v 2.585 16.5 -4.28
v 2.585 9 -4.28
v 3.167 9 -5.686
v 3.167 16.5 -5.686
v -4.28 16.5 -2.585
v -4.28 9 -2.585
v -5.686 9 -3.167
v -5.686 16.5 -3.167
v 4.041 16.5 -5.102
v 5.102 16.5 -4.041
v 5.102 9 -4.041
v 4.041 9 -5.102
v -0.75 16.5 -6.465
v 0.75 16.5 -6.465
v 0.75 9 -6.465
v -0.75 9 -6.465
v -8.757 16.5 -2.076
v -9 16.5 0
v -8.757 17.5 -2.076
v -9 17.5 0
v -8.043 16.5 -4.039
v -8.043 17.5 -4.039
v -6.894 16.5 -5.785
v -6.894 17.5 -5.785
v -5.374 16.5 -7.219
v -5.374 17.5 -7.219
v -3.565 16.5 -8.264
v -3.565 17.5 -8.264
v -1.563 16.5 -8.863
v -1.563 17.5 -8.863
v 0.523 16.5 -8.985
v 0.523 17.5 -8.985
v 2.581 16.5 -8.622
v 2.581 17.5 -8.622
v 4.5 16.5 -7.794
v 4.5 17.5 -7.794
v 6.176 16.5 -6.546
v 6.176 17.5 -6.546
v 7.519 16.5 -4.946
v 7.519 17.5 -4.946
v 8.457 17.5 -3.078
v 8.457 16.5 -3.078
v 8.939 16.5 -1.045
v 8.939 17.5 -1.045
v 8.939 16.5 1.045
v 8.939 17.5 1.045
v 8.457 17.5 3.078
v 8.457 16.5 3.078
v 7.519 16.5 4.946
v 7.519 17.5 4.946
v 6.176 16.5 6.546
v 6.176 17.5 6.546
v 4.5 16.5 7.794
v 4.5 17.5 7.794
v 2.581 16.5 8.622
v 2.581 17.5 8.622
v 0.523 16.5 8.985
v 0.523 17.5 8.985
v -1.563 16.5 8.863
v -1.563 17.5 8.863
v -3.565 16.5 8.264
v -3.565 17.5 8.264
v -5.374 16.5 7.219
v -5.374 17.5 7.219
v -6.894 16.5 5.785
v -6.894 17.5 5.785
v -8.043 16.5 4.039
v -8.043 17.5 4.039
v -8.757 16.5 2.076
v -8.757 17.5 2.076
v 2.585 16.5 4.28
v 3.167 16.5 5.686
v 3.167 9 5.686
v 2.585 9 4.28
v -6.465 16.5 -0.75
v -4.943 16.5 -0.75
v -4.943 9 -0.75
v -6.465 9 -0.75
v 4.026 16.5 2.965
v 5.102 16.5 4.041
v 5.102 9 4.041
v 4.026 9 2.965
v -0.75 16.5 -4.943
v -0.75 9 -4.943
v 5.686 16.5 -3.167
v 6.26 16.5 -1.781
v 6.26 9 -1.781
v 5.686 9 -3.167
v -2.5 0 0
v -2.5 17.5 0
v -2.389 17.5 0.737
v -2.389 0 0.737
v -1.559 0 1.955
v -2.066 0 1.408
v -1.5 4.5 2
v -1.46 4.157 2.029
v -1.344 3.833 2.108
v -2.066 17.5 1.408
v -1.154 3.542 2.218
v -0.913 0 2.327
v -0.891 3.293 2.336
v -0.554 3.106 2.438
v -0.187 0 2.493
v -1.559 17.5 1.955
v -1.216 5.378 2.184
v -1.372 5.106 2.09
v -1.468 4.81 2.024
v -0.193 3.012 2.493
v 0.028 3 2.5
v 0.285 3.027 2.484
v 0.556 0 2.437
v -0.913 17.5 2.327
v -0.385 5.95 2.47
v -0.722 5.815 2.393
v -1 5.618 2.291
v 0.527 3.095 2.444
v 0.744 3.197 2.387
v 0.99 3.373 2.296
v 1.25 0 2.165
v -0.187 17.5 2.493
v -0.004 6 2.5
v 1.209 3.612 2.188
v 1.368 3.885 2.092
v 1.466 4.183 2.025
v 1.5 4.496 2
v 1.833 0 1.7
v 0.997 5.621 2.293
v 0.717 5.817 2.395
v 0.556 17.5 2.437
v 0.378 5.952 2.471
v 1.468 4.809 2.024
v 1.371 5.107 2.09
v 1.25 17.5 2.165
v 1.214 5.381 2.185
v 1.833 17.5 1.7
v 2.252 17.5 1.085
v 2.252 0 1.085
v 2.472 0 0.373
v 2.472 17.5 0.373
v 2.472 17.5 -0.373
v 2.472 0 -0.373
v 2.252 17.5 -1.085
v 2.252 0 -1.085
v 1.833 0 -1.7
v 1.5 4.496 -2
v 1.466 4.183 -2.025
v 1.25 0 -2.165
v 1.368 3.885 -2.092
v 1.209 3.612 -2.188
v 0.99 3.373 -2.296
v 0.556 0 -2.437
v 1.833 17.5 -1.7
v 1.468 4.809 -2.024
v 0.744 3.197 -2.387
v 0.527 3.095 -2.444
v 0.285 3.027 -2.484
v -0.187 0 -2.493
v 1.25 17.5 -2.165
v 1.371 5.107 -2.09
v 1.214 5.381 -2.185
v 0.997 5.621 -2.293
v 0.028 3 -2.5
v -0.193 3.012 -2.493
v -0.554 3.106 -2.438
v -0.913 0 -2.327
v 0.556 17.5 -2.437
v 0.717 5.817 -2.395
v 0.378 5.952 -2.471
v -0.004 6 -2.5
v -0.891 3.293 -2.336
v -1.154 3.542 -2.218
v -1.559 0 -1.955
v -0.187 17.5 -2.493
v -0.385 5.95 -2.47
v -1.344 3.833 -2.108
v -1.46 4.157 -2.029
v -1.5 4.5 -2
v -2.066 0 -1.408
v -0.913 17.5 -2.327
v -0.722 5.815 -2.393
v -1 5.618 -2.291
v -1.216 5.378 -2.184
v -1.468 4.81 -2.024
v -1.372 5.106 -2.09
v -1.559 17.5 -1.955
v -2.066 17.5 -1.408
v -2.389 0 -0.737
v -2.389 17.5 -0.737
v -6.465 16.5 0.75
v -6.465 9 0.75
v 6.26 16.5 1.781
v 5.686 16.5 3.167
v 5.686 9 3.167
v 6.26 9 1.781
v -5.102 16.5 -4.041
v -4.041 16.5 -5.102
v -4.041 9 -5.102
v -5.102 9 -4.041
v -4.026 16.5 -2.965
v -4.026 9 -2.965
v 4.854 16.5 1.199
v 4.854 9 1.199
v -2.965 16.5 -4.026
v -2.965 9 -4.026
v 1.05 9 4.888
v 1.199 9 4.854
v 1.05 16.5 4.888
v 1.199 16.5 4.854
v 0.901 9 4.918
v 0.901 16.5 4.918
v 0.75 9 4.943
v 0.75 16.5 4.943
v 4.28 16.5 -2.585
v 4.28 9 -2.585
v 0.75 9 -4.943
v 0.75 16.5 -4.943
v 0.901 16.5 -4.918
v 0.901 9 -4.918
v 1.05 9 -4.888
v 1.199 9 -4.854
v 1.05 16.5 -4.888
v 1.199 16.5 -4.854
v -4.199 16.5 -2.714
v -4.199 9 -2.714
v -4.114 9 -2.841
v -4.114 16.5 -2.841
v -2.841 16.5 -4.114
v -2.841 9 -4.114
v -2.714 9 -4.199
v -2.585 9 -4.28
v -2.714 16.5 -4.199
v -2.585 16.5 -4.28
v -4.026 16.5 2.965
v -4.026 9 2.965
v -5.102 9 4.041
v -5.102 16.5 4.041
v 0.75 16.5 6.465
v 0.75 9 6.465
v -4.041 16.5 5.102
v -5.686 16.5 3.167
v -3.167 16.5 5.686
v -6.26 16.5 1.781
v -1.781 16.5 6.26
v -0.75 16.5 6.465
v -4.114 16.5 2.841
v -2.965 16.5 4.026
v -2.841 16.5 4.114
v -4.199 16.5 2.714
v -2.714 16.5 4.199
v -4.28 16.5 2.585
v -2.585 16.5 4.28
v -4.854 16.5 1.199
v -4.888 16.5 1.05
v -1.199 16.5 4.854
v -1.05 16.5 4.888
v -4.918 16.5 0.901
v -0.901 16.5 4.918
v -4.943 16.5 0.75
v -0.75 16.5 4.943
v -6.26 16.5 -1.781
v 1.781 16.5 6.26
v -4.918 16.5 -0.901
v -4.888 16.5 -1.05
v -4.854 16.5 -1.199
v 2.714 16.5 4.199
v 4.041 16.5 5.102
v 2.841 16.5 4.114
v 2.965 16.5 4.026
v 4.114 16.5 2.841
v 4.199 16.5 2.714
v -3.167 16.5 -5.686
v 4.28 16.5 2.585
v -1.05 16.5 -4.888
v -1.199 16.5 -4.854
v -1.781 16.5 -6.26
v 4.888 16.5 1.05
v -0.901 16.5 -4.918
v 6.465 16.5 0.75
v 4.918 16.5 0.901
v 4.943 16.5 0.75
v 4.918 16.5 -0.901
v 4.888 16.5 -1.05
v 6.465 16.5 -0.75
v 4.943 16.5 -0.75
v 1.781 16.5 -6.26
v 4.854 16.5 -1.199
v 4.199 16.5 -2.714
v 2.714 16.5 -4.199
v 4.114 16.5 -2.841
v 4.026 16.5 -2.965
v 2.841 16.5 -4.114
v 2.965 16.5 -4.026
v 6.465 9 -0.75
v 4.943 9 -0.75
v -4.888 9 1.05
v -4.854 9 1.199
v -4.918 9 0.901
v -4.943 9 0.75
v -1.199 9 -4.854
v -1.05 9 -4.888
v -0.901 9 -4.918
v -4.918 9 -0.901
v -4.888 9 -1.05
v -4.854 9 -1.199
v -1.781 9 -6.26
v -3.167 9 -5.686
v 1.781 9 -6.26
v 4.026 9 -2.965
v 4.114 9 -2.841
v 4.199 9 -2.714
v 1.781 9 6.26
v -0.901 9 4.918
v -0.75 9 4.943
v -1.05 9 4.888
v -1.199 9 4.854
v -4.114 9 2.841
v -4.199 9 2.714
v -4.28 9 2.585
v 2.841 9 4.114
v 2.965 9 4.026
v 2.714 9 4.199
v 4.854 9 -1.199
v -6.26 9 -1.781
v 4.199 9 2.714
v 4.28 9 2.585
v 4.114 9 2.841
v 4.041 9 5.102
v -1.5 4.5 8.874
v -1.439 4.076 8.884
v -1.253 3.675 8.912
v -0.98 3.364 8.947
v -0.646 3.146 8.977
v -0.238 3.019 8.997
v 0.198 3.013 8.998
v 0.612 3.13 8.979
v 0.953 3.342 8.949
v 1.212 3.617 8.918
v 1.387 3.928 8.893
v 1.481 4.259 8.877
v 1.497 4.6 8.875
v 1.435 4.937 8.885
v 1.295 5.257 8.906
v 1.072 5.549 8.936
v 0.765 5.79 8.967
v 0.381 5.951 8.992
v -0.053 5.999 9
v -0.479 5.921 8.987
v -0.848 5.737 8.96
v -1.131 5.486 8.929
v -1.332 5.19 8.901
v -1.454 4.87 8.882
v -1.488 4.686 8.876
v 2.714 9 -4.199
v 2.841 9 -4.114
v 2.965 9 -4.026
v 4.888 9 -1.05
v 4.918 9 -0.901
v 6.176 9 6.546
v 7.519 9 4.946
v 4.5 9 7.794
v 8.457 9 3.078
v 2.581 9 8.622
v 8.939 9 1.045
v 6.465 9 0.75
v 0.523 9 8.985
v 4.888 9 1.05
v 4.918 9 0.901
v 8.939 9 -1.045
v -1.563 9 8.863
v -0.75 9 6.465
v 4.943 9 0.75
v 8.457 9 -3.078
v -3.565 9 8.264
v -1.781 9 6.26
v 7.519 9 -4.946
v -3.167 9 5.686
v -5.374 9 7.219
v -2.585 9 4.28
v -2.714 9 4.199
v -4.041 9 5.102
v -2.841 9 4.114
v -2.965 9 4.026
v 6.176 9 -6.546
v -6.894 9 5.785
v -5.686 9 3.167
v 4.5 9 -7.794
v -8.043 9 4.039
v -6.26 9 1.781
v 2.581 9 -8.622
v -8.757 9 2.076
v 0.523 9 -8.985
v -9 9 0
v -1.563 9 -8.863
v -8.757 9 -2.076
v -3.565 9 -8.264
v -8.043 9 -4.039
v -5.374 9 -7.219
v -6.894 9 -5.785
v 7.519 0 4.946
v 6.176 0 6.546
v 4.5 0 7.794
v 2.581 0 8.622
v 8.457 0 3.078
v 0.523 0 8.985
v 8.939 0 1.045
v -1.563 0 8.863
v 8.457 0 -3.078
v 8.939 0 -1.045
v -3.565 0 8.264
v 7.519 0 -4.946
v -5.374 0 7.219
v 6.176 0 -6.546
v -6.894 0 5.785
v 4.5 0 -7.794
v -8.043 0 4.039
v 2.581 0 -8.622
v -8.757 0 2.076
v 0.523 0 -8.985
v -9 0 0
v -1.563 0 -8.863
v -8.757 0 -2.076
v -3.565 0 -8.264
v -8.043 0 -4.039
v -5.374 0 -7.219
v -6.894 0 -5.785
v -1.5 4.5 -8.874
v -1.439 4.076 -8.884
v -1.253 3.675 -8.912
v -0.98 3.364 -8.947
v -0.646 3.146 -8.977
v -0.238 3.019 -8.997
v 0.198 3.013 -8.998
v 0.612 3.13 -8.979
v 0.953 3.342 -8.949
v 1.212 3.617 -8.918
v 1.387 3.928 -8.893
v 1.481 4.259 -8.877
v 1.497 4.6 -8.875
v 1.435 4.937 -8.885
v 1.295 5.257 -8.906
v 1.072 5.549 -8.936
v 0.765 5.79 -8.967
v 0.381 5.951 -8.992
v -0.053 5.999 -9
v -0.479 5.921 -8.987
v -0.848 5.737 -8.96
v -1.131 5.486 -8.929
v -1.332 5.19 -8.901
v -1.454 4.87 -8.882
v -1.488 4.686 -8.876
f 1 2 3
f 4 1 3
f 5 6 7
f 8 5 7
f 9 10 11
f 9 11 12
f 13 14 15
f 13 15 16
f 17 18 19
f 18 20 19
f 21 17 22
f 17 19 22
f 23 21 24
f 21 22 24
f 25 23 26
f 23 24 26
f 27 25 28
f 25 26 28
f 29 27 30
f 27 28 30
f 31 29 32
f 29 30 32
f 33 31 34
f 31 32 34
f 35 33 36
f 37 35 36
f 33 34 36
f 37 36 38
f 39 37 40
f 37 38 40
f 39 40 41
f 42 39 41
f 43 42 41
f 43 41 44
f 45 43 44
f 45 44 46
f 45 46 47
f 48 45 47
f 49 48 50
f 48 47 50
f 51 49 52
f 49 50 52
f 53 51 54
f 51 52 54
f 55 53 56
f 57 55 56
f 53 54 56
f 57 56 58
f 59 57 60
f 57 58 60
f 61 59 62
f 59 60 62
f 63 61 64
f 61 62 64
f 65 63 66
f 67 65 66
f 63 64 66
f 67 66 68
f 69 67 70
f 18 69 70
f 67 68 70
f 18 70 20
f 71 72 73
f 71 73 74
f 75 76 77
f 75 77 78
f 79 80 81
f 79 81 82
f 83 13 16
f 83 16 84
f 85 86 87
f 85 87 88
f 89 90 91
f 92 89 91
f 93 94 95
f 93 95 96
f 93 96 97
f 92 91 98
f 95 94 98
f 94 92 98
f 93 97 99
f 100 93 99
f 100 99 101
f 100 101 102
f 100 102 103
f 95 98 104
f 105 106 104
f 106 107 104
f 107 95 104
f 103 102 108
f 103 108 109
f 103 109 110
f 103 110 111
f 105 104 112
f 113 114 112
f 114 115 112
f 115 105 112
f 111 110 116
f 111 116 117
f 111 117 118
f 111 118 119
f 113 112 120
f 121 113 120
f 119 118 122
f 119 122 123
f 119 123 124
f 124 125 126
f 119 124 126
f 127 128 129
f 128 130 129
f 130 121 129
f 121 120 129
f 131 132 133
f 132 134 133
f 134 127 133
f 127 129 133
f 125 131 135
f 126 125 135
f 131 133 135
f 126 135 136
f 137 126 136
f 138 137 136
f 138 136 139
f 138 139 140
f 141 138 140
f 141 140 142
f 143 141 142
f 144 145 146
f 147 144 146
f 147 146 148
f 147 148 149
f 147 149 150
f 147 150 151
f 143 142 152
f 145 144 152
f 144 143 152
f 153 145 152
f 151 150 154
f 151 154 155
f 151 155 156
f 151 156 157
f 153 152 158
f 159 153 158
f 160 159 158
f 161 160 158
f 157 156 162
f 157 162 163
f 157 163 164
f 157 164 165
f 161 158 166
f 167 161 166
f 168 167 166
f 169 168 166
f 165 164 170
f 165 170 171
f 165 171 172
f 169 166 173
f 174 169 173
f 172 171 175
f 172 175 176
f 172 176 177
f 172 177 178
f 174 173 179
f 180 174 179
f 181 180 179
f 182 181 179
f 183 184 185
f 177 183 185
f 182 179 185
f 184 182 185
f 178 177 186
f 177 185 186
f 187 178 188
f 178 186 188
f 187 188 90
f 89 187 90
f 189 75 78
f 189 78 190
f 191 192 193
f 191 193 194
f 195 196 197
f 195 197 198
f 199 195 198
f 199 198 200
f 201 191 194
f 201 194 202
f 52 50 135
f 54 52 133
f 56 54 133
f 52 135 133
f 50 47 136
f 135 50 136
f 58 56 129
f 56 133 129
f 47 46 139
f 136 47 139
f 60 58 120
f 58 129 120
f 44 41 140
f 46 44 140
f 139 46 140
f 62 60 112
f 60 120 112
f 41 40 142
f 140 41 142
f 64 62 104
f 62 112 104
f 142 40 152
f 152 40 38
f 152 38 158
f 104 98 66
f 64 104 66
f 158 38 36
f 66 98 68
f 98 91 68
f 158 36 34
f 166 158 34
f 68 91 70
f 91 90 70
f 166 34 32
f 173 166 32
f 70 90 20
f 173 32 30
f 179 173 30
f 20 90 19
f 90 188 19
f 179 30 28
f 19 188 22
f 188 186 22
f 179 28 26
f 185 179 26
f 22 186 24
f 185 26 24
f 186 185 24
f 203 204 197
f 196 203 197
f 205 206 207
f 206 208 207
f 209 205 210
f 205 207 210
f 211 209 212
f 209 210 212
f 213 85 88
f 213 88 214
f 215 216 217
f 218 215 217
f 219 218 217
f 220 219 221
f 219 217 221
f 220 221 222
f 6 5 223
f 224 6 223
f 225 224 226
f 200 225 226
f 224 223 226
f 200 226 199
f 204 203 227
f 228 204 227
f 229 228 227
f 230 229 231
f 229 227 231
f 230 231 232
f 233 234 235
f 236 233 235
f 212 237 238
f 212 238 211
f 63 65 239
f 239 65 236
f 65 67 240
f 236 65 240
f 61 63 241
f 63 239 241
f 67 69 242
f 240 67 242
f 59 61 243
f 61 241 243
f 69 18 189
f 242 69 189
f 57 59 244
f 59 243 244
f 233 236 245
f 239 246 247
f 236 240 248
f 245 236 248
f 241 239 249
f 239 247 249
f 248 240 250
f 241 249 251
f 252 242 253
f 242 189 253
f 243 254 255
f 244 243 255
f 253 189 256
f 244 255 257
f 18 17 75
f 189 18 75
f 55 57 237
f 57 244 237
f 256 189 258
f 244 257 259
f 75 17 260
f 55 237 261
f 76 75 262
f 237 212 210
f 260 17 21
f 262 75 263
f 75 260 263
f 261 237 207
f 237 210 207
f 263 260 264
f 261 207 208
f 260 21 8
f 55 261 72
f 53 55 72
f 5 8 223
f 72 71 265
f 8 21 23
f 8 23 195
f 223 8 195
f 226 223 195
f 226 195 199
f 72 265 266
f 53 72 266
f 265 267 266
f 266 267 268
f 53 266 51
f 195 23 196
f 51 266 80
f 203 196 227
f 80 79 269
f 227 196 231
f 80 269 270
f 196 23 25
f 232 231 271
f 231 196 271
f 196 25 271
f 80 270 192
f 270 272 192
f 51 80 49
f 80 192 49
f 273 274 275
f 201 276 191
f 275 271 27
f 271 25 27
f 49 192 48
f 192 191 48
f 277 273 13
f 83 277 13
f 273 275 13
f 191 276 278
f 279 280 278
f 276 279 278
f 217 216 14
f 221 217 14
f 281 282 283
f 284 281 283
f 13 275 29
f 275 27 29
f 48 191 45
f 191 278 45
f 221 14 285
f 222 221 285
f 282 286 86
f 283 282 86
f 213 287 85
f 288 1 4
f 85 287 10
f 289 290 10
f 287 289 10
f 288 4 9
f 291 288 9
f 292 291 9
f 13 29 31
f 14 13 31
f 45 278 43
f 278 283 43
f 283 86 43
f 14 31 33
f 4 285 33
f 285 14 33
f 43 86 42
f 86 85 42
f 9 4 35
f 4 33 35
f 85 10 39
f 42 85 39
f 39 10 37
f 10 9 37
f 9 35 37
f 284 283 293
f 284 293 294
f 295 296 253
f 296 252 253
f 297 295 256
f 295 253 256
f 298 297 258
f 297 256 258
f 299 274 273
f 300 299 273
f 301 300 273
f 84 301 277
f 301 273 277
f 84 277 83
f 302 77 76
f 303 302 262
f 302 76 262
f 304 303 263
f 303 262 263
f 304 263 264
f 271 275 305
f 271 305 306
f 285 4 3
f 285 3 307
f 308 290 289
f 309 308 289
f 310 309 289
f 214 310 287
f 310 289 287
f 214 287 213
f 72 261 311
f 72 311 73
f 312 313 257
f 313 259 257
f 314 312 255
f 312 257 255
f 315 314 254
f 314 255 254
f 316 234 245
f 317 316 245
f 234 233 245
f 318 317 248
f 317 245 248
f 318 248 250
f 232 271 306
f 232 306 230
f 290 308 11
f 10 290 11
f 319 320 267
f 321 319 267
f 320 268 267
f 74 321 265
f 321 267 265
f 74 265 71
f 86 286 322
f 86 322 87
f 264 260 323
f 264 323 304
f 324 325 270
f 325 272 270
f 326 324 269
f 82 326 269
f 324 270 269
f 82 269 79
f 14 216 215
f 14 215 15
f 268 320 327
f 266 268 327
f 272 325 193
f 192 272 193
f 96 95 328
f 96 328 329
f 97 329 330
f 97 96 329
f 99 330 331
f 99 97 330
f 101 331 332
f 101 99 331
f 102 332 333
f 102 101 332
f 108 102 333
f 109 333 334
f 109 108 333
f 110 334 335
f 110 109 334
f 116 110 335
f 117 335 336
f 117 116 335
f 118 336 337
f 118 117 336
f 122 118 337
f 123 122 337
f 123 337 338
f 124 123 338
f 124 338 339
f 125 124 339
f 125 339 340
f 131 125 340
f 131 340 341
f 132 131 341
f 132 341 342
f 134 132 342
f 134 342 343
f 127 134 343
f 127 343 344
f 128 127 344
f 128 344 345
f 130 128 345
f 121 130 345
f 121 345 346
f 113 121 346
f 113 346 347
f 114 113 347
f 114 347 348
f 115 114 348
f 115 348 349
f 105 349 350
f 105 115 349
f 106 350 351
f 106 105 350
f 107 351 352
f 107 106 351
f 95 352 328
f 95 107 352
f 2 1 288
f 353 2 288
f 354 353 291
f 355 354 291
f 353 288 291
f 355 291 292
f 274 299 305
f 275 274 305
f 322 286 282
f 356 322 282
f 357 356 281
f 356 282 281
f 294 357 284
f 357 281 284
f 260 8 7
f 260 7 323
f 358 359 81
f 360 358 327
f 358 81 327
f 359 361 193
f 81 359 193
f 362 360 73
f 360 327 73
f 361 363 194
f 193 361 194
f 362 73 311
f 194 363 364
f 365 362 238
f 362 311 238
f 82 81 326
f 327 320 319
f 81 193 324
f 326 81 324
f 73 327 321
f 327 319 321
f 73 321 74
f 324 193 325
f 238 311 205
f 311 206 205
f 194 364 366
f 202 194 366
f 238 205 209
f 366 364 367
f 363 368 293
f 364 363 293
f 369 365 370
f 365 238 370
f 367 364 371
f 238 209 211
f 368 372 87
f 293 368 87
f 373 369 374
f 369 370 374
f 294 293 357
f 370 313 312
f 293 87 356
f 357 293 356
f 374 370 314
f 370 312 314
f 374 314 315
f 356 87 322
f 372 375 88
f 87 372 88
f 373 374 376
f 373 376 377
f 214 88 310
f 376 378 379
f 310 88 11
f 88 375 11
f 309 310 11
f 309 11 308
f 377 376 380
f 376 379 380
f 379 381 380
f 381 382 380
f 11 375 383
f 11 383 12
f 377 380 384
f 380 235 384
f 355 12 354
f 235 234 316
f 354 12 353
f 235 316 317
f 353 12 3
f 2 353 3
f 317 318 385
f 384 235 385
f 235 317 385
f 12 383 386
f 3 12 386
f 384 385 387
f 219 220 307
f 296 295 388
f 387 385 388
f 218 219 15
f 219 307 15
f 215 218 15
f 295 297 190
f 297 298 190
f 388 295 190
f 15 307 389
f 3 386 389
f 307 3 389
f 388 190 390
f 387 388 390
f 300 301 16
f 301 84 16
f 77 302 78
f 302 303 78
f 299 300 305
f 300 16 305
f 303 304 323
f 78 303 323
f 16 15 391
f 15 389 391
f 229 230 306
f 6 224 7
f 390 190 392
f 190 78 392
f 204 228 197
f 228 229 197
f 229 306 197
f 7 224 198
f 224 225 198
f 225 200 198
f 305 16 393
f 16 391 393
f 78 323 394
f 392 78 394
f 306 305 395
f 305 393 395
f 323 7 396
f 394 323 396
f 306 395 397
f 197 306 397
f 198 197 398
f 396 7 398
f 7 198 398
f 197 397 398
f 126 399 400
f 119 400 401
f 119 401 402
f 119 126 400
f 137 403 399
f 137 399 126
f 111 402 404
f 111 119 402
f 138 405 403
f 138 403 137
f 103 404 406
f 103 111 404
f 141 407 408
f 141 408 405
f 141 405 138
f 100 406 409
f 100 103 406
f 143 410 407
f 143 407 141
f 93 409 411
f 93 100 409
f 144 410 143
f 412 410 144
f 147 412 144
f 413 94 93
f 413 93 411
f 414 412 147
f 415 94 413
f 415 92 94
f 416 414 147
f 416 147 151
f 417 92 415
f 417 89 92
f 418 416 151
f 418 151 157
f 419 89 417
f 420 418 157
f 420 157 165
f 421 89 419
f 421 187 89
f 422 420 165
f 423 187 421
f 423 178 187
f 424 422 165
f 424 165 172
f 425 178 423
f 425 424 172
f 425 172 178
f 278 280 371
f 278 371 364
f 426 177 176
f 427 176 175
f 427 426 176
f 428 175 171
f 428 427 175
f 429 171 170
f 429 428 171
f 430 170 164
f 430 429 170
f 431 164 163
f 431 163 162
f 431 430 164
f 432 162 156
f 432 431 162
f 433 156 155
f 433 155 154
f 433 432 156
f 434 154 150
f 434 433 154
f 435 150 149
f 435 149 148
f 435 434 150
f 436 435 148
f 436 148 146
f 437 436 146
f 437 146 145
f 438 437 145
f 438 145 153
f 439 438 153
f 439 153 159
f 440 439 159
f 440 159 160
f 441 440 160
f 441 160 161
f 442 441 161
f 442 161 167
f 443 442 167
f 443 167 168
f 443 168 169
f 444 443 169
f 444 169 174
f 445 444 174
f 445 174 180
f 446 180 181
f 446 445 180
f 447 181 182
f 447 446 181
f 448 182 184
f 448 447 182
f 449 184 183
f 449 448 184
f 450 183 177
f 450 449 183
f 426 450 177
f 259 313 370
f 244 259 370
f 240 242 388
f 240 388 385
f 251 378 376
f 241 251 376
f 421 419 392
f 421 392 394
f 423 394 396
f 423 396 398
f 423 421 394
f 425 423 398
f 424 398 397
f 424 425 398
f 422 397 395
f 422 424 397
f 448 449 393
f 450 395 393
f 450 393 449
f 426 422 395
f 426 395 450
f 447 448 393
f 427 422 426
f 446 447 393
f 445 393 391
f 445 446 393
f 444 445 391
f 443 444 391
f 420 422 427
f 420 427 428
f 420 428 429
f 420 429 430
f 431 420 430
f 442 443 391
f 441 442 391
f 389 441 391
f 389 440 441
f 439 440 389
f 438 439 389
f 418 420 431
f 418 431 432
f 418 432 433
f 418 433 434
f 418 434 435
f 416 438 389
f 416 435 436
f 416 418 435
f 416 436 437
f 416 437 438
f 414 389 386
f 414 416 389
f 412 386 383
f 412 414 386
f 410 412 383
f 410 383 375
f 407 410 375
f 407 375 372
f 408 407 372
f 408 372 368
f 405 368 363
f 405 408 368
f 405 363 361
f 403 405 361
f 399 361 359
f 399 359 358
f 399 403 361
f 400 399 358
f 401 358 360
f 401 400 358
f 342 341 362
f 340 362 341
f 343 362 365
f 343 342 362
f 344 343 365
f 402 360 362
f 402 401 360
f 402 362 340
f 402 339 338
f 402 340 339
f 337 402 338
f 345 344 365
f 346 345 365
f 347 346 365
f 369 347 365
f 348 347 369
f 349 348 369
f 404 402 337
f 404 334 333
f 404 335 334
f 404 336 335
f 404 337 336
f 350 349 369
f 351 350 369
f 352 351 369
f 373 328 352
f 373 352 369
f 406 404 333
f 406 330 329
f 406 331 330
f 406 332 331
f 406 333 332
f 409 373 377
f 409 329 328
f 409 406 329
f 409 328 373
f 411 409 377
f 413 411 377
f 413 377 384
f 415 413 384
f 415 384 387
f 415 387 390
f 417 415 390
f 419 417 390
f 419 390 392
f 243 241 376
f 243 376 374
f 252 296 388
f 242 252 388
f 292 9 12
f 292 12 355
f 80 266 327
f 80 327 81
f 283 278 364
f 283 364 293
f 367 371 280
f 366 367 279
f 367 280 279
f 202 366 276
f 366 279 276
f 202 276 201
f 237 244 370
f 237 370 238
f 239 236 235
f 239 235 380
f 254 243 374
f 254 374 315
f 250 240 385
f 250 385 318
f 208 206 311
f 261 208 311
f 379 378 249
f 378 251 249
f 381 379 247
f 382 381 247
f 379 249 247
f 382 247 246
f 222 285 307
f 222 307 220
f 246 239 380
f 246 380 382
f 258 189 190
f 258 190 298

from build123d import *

# Parameters (mm, degrees)
ESBO_O2_R                  = 2.5
CORTE_EXTRUS_O1_DEPTH      = 20
RESSALTO_EXTRUS_O1_DEPTH   = 8.5
CORTE_EXTRUS_O2_DEPTH      = 10
CORTE_EXTRUS_O2_DEPTH_BACK = 10
ESBO_O5_R                  = 1.5


with BuildPart() as part:
    # Esboço1 → Revolução1 (revolve)
    with BuildSketch(Plane.XY):
        Polygon((0, 17.5), (0, 0), (-5, 0), (-9, 0), (-9, 8), (-9, 9), (-5, 9), (-5, 16.5), (-9, 16.5), (-9, 17.5), align=None)
    revolve(axis=Axis((0, 17.5, 0), (0, -1, 0)))

    # Esboço2 → Corte-extrusão1 (cut)
    with BuildSketch(Plane(origin=(0, 17.5, 0), x_dir=(1, 0, 0), z_dir=(0, 1, 0))):
        with Locations(Location((0, 0, 0), (0, 0, 180))):
            Circle(ESBO_O2_R)
    extrude(amount=-CORTE_EXTRUS_O1_DEPTH, mode=Mode.SUBTRACT)

    # Esboço4 → Ressalto-extrusão1 (add)
    with BuildSketch(Plane(origin=(0, 17.5, 0), x_dir=(1, 0, 0), z_dir=(0, 1, 0))):
        Polygon((0.75, 2.711240108), (0.539299188, 2.711240108), (1.535794152, 2.298478379), (1.38680618, 2.447466352), (2.135819299, 3.196479471), (3.167059402, 5.686113314), (1.781240103, 6.260138462), (0.75, 3.770504619), align=None)
        Polygon((1.73045632, 2.217846669), (1.535794152, 2.298478379), (2.298478379, 1.535794152), (2.217846669, 1.73045632), (3.196479471, 2.135819299), (5.101962719, 4.041302547), (4.041302547, 5.101962719), (2.135819299, 3.196479471), align=None)
        Polygon((2.447466352, 1.38680618), (2.298478379, 1.535794152), (2.711240108, 0.539299188), (2.711240108, 0.75), (3.770504619, 0.75), (6.260138462, 1.781240103), (5.686113314, 3.167059402), (3.196479471, 2.135819299), align=None)
        Polygon((0.539299188, 2.711240108), (0.344637021, 2.791871818), (0.75, 3.770504619), (0.75, 6.465264872), (-0.75, 6.465264872), (-0.75, 3.770504619), (-0.344637021, 2.791871818), (-0.539299188, 2.711240108), align=None)
        Polygon((-1.535794152, 2.298478379), (-0.539299188, 2.711240108), (-0.75, 2.711240108), (-0.75, 3.770504619), (-1.781240103, 6.260138462), (-3.167059402, 5.686113314), (-2.135819299, 3.196479471), (-1.38680618, 2.447466352), align=None)
        Polygon((-2.298478379, 1.535794152), (-1.535794152, 2.298478379), (-1.73045632, 2.217846669), (-2.135819299, 3.196479471), (-4.041302547, 5.101962719), (-5.101962719, 4.041302547), (-3.196479471, 2.135819299), (-2.217846669, 1.73045632), align=None)
        Polygon((-2.711240108, 0.539299188), (-2.298478379, 1.535794152), (-2.447466352, 1.38680618), (-3.196479471, 2.135819299), (-5.686113314, 3.167059402), (-6.260138462, 1.781240103), (-3.770504619, 0.75), (-2.711240108, 0.75), align=None)
        Polygon((-2.711240108, -0.539299188), (-2.711240108, 0.539299188), (-2.791871818, 0.344637021), (-3.770504619, 0.75), (-6.465264872, 0.75), (-6.465264872, -0.75), (-3.770504619, -0.75), (-2.791871818, -0.344637021), align=None)
        Polygon((-2.298478379, -1.535794152), (-2.711240108, -0.539299188), (-2.711240108, -0.75), (-3.770504619, -0.75), (-6.260138462, -1.781240103), (-5.686113314, -3.167059402), (-3.196479471, -2.135819299), (-2.447466352, -1.38680618), align=None)
        Polygon((-1.535794152, -2.298478379), (-2.298478379, -1.535794152), (-2.217846669, -1.73045632), (-3.196479471, -2.135819299), (-5.101962719, -4.041302547), (-4.041302547, -5.101962719), (-2.135819299, -3.196479471), (-1.73045632, -2.217846669), align=None)
        Polygon((-0.539299188, -2.711240108), (-1.535794152, -2.298478379), (-1.38680618, -2.447466352), (-2.135819299, -3.196479471), (-3.167059402, -5.686113314), (-1.781240103, -6.260138462), (-0.75, -3.770504619), (-0.75, -2.711240108), align=None)
        Polygon((0.344637021, -2.791871818), (0.539299188, -2.711240108), (-0.539299188, -2.711240108), (-0.344637021, -2.791871818), (-0.75, -3.770504619), (-0.75, -6.465264872), (0.75, -6.465264872), (0.75, -3.770504619), align=None)
        Polygon((1.38680618, -2.447466352), (1.535794152, -2.298478379), (0.539299188, -2.711240108), (0.75, -2.711240108), (0.75, -3.770504619), (1.781240103, -6.260138462), (3.167059402, -5.686113314), (2.135819299, -3.196479471), align=None)
        Polygon((2.217846669, -1.73045632), (2.298478379, -1.535794152), (1.535794152, -2.298478379), (1.73045632, -2.217846669), (2.135819299, -3.196479471), (4.041302547, -5.101962719), (5.101962719, -4.041302547), (3.196479471, -2.135819299), align=None)
        Polygon((2.711240108, -0.75), (2.711240108, -0.539299188), (2.298478379, -1.535794152), (2.447466352, -1.38680618), (3.196479471, -2.135819299), (5.686113314, -3.167059402), (6.260138462, -1.781240103), (3.770504619, -0.75), align=None)
        Polygon((2.791871818, 0.344637021), (2.711240108, 0.539299188), (2.711240108, -0.539299188), (2.791871818, -0.344637021), (3.770504619, -0.75), (6.465264872, -0.75), (6.465264872, 0.75), (3.770504619, 0.75), align=None)
    extrude(amount=-RESSALTO_EXTRUS_O1_DEPTH)

    # Esboço5 → Corte-extrusão2 (cut, two sides: drawn at the far end of the back side and taken through both)
    with BuildSketch(Plane.XY.offset(-CORTE_EXTRUS_O2_DEPTH_BACK)):
        with Locations(Location((0, 4.5, 0), (0, 0, 180))):
            Circle(ESBO_O5_R)
    extrude(amount=CORTE_EXTRUS_O2_DEPTH + CORTE_EXTRUS_O2_DEPTH_BACK, mode=Mode.SUBTRACT)


solid = part.part
